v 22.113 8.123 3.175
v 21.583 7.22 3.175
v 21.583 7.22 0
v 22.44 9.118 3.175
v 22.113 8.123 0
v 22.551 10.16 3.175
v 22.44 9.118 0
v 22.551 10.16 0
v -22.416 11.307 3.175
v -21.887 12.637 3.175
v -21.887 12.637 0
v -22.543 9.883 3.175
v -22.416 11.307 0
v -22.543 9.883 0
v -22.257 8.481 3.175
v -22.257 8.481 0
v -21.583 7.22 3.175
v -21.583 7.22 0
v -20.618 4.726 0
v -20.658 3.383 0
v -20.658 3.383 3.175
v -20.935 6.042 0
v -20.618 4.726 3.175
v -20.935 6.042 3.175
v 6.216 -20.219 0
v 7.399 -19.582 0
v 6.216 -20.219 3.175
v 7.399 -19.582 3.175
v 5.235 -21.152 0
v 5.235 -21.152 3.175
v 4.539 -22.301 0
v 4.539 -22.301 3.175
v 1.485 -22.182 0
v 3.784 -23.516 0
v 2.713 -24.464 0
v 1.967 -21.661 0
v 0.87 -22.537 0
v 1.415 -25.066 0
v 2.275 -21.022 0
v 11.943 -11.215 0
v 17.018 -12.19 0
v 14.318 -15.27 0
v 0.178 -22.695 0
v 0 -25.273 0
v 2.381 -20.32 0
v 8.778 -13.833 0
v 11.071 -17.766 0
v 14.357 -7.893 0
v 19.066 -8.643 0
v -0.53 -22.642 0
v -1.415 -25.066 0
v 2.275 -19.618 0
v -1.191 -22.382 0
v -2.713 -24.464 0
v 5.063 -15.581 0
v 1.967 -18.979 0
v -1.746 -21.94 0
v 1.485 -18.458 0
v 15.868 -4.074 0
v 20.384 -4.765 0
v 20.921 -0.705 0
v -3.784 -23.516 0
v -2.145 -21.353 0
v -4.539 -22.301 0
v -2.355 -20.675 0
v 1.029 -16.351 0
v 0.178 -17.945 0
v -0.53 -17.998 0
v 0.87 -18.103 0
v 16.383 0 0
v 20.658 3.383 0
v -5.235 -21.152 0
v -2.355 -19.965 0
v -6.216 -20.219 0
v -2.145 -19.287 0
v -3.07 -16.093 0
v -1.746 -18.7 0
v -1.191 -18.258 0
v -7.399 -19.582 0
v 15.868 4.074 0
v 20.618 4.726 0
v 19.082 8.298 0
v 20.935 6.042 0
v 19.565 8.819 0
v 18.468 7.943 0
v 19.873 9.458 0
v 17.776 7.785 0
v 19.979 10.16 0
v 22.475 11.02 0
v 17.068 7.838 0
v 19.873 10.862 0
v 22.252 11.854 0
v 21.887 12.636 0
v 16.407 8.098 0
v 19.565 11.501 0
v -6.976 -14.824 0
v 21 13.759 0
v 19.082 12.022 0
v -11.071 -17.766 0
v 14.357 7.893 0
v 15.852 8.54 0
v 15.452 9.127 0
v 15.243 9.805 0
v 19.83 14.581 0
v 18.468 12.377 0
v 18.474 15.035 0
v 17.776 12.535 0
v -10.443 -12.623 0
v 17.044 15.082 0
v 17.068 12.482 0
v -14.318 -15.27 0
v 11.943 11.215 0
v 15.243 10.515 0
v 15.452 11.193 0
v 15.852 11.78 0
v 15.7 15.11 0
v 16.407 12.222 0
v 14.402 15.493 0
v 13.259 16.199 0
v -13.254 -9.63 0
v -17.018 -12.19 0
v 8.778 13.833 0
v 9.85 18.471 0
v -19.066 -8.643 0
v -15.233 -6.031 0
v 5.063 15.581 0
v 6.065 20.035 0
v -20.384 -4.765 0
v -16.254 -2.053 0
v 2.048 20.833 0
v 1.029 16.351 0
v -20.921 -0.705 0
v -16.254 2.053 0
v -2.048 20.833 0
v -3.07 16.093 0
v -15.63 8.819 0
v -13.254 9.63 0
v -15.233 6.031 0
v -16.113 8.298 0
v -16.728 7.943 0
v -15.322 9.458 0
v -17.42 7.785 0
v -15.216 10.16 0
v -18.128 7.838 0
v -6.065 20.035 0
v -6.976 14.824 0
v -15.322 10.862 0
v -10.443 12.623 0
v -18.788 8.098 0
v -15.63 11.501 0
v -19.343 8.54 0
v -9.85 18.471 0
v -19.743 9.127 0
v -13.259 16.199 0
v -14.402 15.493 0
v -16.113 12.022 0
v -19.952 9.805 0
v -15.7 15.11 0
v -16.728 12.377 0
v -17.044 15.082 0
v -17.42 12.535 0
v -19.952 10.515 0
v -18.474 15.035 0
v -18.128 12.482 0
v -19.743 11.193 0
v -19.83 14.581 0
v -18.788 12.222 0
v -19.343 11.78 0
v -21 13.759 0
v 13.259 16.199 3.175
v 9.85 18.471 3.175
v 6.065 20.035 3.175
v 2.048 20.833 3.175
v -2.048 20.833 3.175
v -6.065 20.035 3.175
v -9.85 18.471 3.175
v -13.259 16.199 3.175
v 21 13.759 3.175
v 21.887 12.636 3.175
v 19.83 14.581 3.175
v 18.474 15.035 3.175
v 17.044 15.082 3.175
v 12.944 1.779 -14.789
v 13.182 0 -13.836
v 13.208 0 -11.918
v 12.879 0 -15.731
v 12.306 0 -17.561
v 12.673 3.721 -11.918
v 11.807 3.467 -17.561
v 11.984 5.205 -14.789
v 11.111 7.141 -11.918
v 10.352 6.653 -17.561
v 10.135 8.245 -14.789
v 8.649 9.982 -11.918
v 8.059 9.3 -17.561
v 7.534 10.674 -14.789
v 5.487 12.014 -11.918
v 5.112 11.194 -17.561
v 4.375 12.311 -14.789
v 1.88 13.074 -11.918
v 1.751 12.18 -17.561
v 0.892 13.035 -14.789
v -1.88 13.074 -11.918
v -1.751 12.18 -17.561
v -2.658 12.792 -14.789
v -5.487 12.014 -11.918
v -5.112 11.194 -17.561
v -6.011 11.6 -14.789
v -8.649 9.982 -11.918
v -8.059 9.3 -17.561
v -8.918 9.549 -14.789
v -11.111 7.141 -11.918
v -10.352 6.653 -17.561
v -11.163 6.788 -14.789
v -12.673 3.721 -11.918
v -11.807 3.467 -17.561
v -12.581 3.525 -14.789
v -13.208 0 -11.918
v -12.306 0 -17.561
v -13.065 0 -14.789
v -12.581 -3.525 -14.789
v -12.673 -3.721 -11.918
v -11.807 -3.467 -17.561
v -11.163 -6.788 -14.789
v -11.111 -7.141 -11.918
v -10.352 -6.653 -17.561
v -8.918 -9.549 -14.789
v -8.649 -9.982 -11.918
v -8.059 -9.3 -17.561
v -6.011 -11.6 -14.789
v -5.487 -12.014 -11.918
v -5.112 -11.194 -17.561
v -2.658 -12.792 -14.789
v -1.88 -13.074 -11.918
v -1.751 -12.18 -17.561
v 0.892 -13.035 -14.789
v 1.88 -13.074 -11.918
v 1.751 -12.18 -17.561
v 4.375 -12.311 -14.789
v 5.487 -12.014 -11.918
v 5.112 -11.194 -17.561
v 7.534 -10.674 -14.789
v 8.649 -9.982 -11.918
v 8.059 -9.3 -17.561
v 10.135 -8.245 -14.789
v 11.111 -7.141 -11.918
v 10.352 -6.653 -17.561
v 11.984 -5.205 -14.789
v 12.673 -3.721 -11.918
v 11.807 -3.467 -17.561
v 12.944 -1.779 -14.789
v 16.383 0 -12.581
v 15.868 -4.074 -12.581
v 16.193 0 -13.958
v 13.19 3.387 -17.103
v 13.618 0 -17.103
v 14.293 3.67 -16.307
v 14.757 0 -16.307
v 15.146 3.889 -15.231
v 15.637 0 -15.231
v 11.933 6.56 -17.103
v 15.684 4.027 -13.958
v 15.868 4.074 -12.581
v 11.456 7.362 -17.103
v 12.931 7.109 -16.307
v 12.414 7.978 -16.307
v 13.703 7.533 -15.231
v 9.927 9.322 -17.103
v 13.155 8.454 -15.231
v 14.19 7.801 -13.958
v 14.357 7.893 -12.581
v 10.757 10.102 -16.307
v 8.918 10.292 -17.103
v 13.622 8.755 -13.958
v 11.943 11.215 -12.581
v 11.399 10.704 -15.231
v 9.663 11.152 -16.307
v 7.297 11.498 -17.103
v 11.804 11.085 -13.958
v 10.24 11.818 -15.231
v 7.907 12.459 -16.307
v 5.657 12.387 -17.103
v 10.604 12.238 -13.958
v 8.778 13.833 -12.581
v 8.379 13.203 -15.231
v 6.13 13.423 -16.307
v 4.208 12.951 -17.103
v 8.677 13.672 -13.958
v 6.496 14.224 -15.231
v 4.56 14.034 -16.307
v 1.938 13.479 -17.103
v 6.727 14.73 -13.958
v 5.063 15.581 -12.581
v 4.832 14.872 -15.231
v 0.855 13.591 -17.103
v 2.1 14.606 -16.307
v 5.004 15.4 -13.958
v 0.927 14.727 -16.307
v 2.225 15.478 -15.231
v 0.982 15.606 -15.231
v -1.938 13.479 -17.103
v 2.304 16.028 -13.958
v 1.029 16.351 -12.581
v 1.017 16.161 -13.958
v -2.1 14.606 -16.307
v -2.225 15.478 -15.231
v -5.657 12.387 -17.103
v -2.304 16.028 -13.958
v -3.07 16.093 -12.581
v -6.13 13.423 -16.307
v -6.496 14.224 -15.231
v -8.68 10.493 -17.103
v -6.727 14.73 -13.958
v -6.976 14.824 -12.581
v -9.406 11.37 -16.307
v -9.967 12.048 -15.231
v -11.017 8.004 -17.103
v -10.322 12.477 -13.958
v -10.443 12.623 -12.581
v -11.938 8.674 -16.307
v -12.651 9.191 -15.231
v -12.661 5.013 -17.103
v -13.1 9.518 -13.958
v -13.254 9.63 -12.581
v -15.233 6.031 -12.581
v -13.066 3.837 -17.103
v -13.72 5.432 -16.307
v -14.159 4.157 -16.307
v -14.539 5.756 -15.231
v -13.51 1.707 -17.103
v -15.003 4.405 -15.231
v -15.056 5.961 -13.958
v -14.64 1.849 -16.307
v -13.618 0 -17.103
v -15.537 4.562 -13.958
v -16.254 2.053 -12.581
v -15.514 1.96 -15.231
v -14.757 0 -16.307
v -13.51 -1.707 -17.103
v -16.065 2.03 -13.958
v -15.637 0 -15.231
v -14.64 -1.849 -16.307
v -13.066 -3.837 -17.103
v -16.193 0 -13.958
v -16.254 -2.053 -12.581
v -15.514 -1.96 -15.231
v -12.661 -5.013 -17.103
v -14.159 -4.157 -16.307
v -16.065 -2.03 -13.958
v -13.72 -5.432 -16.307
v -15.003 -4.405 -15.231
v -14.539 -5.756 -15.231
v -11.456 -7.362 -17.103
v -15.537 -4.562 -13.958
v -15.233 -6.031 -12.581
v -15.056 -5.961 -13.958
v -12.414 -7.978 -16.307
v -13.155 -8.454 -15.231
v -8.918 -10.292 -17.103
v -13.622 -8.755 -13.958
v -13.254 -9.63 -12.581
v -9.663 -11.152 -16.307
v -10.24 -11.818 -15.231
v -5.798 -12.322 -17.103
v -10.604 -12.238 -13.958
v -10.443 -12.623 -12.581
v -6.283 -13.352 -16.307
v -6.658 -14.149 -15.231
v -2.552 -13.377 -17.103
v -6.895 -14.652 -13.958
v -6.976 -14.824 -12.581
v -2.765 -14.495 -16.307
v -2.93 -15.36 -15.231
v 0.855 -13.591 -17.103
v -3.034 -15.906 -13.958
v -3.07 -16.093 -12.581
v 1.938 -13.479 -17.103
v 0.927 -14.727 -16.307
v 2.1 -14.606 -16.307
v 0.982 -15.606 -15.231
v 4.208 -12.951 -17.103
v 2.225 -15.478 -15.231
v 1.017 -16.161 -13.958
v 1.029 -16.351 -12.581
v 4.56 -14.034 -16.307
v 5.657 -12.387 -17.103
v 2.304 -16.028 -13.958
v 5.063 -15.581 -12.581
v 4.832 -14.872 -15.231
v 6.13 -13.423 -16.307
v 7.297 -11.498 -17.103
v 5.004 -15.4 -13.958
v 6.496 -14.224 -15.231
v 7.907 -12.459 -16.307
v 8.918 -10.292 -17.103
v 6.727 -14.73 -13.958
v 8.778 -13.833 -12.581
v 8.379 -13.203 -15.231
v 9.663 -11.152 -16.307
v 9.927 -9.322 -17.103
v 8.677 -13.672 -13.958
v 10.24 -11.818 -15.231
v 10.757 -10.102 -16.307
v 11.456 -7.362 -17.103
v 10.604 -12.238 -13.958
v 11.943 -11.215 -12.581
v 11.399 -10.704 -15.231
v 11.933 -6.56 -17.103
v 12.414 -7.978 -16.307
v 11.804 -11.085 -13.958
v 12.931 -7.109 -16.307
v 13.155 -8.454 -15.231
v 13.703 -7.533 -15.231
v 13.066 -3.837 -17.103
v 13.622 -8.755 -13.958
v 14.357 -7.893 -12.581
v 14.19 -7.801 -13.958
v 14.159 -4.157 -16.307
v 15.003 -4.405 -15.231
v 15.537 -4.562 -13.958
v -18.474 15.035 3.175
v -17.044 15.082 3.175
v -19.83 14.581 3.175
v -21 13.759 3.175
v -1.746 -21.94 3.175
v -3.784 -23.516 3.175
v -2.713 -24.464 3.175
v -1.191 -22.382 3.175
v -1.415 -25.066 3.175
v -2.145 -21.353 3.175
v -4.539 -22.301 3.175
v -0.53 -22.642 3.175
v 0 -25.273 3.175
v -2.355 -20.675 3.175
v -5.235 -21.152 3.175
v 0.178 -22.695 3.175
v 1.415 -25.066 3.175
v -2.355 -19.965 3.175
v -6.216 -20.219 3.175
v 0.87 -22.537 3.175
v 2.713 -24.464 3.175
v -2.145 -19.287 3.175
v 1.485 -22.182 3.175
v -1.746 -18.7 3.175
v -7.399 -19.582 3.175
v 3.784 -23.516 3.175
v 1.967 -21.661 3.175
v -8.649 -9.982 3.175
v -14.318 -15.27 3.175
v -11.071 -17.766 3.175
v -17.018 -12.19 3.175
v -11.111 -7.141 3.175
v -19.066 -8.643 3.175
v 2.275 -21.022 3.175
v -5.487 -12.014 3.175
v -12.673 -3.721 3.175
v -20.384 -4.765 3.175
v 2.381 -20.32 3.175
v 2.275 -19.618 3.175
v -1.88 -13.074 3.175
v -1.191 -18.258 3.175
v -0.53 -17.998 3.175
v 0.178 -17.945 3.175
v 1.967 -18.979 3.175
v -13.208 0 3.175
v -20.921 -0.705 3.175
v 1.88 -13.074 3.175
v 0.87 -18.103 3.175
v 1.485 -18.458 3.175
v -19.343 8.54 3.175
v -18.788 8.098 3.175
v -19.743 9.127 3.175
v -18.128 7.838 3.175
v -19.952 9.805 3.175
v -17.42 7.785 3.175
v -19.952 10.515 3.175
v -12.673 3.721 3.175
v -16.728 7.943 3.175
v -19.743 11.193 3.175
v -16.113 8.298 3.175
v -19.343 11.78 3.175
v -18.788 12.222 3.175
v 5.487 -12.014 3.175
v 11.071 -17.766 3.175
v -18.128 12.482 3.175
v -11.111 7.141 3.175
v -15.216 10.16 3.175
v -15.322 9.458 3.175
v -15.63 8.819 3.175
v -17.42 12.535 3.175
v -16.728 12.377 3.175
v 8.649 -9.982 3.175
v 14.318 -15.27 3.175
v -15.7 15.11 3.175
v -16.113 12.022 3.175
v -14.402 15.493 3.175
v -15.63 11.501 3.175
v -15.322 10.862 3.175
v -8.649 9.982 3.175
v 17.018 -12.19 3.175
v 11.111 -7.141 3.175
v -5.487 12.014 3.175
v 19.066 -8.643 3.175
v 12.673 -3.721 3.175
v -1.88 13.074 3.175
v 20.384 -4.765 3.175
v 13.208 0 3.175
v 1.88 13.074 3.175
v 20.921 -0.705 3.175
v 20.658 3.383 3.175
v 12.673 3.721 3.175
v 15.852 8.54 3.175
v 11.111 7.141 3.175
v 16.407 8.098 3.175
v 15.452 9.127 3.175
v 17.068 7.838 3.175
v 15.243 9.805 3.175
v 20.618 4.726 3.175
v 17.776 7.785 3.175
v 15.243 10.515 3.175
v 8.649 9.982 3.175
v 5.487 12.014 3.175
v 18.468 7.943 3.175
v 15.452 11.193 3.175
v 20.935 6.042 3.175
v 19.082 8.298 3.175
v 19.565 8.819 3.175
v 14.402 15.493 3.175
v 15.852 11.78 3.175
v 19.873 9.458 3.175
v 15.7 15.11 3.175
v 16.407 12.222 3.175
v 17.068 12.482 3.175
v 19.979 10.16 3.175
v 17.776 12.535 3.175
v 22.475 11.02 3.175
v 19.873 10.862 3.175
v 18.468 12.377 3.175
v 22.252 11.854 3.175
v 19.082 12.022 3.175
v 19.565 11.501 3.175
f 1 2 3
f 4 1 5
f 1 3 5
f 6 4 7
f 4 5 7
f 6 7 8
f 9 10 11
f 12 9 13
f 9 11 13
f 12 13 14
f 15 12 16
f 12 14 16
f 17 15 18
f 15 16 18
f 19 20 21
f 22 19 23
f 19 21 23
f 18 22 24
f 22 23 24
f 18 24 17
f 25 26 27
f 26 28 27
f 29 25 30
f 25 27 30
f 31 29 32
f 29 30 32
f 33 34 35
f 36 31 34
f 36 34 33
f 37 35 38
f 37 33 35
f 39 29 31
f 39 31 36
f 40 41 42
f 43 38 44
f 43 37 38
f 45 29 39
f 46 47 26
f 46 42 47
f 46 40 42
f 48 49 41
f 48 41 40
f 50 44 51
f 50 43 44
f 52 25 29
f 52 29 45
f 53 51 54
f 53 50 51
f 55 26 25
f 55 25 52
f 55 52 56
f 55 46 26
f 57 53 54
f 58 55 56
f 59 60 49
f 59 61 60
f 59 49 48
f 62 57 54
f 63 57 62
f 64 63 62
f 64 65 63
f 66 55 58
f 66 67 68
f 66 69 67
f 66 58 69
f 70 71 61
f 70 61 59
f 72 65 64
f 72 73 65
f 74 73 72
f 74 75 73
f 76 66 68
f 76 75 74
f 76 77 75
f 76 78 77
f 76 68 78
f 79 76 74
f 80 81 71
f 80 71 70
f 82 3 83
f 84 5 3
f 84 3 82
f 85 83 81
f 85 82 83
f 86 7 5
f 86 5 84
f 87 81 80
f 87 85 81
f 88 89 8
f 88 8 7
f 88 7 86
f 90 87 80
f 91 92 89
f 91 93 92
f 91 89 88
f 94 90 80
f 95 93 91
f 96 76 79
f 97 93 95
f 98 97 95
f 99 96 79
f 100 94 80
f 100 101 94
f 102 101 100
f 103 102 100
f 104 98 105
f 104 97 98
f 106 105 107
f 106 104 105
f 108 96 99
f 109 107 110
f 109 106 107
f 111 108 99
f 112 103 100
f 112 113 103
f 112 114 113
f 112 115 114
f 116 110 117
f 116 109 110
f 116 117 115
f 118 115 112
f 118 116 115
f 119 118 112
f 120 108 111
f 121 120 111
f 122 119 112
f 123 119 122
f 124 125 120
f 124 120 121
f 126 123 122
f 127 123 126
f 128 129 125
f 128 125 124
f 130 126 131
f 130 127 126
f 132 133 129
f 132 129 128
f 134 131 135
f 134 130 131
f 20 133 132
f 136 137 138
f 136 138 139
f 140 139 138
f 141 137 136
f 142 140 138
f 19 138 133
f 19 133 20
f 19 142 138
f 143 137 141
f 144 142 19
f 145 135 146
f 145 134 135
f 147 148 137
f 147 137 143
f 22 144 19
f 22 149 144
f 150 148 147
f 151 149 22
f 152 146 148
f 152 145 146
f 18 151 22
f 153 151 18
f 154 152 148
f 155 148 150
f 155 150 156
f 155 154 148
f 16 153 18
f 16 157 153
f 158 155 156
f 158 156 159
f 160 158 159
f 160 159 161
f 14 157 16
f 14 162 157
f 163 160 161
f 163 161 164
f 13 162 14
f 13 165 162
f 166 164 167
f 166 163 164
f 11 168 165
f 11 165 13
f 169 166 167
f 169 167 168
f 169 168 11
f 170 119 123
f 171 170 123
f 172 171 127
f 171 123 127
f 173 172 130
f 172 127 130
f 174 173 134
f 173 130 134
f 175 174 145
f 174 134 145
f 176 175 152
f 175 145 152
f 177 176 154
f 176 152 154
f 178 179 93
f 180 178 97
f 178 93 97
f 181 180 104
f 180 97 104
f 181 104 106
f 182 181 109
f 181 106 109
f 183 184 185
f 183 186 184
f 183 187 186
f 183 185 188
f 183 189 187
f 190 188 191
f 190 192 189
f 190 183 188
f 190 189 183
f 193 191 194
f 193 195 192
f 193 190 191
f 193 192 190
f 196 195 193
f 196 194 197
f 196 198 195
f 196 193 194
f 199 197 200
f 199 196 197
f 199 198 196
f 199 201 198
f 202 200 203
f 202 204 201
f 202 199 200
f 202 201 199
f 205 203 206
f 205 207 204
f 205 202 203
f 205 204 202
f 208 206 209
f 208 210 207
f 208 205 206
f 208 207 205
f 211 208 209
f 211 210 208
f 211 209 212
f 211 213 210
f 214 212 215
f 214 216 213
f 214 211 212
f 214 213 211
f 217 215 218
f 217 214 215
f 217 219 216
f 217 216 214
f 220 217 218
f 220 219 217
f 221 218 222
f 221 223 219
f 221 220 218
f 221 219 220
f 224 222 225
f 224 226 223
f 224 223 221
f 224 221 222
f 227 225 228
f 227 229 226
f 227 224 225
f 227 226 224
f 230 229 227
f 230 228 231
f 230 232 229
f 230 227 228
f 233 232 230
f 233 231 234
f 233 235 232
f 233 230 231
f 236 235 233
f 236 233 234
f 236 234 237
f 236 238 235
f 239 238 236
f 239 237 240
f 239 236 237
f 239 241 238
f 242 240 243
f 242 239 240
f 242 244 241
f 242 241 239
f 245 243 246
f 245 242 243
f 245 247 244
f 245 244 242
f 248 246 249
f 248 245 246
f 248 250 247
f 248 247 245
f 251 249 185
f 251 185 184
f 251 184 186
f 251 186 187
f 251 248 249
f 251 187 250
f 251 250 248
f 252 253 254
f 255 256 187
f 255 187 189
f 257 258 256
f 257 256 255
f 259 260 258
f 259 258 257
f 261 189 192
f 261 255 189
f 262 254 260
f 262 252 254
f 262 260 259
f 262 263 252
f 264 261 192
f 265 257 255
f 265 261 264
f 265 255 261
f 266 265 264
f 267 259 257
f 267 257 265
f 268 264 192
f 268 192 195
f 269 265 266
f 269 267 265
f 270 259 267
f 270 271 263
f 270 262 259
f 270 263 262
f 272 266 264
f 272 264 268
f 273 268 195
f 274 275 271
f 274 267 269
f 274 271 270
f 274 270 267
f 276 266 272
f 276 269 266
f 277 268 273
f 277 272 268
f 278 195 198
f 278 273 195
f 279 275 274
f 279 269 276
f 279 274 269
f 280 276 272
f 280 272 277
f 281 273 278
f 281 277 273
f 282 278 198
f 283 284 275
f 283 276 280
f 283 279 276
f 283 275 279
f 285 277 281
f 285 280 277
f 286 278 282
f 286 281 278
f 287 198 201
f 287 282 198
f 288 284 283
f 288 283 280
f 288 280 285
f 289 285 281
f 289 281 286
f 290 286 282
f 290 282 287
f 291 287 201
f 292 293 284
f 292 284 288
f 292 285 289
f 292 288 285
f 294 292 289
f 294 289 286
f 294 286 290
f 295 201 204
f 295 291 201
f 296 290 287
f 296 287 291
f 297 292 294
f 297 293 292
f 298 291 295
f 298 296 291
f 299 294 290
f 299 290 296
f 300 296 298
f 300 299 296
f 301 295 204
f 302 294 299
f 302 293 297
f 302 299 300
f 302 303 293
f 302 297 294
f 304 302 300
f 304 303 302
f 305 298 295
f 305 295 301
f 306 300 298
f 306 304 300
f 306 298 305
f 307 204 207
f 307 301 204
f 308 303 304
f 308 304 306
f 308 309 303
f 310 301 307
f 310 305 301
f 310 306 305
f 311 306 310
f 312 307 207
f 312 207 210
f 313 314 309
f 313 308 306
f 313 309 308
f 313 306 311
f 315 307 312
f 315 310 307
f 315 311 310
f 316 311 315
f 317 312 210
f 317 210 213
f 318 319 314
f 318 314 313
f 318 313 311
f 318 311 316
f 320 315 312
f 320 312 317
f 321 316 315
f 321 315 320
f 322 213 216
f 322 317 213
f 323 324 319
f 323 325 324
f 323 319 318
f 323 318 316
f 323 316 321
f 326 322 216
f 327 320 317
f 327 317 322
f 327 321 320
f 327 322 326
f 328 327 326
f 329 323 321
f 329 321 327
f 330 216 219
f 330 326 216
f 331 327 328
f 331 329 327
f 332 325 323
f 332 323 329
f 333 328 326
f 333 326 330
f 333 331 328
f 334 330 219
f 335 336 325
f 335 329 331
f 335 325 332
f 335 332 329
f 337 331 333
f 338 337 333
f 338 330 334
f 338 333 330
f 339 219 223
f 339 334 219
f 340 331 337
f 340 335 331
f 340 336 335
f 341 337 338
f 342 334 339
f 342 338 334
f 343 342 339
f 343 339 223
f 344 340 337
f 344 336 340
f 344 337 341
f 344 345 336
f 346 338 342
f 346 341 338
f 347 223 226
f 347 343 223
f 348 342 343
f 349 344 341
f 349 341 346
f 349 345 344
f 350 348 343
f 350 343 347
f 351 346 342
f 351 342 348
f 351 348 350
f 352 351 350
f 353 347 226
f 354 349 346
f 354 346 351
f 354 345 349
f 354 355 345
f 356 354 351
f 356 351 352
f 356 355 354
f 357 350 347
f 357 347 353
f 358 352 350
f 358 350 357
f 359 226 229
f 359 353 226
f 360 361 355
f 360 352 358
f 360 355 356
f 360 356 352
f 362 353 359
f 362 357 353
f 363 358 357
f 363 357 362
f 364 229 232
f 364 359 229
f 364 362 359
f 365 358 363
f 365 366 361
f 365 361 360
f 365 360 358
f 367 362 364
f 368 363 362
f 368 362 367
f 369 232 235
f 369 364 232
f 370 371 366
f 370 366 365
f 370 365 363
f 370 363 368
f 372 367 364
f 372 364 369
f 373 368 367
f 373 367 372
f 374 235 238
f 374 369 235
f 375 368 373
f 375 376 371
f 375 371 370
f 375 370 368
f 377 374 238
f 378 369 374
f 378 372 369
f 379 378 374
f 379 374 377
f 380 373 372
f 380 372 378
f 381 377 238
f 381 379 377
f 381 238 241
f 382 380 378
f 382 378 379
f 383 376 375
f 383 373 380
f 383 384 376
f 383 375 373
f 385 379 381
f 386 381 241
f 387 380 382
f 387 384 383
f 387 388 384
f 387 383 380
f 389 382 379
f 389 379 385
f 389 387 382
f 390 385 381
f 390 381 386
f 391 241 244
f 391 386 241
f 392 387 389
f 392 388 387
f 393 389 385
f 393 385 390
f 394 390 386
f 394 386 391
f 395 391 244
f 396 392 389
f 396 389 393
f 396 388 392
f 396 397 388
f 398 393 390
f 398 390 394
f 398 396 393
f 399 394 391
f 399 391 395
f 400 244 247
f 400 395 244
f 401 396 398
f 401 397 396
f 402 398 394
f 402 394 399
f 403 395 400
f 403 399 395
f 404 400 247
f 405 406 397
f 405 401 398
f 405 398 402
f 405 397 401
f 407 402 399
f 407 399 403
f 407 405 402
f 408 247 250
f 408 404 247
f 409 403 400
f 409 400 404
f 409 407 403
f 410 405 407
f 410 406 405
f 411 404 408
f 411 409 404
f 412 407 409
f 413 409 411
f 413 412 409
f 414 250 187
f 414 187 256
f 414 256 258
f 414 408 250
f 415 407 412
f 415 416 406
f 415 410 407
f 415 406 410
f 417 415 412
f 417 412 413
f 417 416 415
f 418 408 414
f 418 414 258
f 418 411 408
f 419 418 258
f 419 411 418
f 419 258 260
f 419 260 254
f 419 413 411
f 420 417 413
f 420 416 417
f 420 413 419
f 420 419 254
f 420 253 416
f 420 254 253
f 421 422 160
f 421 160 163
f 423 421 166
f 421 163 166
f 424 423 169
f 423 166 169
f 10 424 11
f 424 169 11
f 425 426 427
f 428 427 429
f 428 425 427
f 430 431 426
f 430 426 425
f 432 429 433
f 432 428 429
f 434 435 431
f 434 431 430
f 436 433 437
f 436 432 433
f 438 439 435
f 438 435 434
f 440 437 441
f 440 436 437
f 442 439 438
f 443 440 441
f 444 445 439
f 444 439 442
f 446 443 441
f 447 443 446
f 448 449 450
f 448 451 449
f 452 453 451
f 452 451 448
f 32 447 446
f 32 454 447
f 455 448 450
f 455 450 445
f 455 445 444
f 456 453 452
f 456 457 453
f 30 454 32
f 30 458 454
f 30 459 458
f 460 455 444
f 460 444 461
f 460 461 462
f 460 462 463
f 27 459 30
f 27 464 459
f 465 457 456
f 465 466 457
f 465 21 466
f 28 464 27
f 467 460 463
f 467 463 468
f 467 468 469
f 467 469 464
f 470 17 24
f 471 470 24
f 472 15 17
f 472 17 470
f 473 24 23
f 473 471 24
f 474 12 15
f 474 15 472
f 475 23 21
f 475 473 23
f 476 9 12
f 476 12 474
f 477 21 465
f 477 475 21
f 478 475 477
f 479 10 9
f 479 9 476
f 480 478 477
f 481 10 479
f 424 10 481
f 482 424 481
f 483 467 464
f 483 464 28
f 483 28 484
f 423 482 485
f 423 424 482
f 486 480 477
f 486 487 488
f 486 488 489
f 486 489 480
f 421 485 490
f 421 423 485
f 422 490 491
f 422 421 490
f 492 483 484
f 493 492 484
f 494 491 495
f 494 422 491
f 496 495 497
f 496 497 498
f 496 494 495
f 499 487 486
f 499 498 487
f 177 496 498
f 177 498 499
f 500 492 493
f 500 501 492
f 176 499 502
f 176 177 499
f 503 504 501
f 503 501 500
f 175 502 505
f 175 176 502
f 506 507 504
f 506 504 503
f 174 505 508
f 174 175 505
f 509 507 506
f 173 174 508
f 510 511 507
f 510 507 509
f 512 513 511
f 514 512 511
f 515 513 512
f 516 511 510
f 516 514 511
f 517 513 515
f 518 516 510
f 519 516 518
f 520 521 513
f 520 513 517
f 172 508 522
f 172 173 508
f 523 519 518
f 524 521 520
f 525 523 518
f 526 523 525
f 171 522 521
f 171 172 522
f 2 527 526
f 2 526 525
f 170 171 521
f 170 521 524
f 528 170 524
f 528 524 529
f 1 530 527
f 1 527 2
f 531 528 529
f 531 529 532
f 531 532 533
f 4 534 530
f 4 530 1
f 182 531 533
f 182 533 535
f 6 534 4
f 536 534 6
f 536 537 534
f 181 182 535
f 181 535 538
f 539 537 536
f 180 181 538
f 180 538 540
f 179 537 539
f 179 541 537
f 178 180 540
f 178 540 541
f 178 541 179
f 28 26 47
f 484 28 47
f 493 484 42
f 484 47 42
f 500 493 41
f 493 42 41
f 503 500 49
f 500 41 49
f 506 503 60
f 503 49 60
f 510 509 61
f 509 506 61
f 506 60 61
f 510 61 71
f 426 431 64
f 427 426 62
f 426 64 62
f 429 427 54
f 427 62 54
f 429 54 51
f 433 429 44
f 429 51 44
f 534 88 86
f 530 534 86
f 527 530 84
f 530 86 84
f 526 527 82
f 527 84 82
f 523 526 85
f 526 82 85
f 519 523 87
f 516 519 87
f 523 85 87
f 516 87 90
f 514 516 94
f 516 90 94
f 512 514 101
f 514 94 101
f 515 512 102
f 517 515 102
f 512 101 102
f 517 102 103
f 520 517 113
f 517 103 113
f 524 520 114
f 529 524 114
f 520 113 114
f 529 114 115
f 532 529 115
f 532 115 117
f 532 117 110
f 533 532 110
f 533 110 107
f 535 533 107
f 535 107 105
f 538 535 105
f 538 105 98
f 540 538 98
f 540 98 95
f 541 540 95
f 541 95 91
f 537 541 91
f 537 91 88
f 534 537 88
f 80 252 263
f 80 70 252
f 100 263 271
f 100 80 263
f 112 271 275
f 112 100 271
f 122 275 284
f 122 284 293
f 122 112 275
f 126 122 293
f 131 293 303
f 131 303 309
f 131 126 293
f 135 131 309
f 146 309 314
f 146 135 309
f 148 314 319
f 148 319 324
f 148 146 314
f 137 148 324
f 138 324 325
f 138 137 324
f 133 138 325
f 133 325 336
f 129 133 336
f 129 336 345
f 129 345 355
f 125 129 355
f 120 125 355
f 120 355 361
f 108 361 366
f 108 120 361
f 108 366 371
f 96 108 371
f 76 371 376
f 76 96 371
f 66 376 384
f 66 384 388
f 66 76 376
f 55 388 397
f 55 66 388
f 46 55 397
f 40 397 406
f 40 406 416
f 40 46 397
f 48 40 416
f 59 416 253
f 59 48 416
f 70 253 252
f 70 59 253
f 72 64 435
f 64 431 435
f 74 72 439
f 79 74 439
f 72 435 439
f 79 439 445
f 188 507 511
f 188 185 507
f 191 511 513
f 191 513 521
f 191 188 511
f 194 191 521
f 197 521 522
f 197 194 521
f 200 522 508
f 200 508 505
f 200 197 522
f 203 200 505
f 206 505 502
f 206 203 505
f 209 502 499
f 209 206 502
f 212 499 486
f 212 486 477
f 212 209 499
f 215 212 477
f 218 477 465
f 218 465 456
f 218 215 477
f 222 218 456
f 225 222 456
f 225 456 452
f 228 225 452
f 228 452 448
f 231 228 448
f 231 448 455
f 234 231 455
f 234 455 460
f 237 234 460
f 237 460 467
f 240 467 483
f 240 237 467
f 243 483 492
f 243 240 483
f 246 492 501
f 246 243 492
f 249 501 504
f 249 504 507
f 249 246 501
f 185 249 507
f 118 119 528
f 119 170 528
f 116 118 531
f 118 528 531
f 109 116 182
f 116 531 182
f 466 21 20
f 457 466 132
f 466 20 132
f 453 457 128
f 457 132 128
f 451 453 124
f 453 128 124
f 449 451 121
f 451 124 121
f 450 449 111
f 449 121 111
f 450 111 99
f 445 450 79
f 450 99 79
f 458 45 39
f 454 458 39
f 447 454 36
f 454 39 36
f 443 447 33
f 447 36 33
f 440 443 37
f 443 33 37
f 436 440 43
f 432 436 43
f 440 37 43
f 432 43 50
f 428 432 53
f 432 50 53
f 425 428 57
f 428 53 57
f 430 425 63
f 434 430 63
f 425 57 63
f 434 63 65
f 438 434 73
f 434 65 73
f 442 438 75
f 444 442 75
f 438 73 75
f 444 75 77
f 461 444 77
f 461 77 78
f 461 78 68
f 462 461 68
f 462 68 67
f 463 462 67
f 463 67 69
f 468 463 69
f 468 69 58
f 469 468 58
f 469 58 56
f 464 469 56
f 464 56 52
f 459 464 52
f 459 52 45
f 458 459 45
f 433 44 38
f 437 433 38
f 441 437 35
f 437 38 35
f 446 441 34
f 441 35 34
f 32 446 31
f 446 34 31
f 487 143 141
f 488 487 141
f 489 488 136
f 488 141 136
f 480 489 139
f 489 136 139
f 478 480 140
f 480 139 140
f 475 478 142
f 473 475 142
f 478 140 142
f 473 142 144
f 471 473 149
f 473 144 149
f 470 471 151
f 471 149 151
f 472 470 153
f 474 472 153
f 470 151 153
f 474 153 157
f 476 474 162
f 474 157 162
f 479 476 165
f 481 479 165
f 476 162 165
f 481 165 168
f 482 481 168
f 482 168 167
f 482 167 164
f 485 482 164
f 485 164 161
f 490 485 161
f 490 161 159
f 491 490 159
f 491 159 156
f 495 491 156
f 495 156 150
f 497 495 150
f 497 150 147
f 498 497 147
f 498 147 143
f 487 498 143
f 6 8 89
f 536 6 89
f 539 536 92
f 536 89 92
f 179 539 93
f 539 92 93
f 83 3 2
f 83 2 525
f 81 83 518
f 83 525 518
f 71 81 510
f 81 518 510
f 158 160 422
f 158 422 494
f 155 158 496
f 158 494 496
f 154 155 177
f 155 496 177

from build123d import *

# Parameters (mm, degrees)
F1_W     = 8.89
F1_H     = 3.175
F3_R     = 2.38125
F4_DEPTH = 3.176
F7_DEPTH = 3.176
F8_R     = 5.08


# Not quite as in the source:
# - a fillet or chamfer that OpenCascade refuses, or shapes differently, is made with other operations: its cross-section is extruded or revolved along the edge and cut away or added


with BuildPart() as f2:
    # F1 (on Front) → F2 (revolve)
    with BuildSketch(Plane.XZ):
        with BuildLine():
            ThreePointArc((13.208, -11.9177163316), (13.0652297207, -14.7887805254), (12.3057501177, -17.5612494052))
            Line((12.3057501177, -17.5612494052), (16.383, -17.5612494052))
            Line((16.383, -17.5612494052), (16.383, 0))
            Line((16.383, 0), (16.383, 3.175))
            Line((16.383, 3.175), (13.208, 3.175))
            Line((13.208, 3.175), (13.208, -11.9177163316))
        make_face()
        with Locations((20.828, 1.5875)):
            Rectangle(F1_W, F1_H)
    revolve(axis=Axis((0, 0, -9.4681101426), (0, 0, 1)))

    # F3 (on face) → F4 (cut, through all)
    with BuildSketch(Plane(origin=(0, 0, 0), x_dir=(1, 0, 0), z_dir=(0, 0, -1))):
        with BuildLine():
            ThreePointArc((0, 17.93875), (1.6837980227, 18.6362019773), (2.38125, 20.32))
            ThreePointArc((2.38125, 20.32), (-1.6837980227, 22.0037980227), (0, 17.93875))
        make_face()
        with Locations((-17.5976362049, -10.16)):
            Circle(F3_R)
        with Locations((17.5976362049, -10.16)):
            Circle(F3_R)
    extrude(amount=-F4_DEPTH, mode=Mode.SUBTRACT)

    # F5: fillet of radius 5.08 on 1 edges, made by hand

    # F5_s1 → F5_t2 (revolve, cut)
    with BuildSketch(Plane.XZ):
        with BuildLine():
            ThreePointArc((12.3057501177, -17.5612494052), (15.2336723724, -15.7993073042), (16.383, -12.5811999876))
            Line((16.383, -12.5811999876), (16.383, -17.5612494052))
            Line((16.383, -17.5612494052), (12.3057501177, -17.5612494052))
        make_face()
    revolve(axis=Axis((0, 0, -17.5612494052), (0, 0, 1)), mode=Mode.SUBTRACT)

    # F6 (on face) → F7 (cut, through all)
    with BuildSketch(Plane(origin=(0, 0, 0), x_dir=(1, 0, 0), z_dir=(0, 0, -1))):
        with BuildLine():
            ThreePointArc((-4.952964542, 20.3387415379), (-3.495667473, 23.8289197652), (0, 25.273))
            ThreePointArc((0, 25.273), (-21.8870601005, 12.6364998776), (-21.8870598885, -12.6365002448))
            ThreePointArc((-21.8870598885, -12.6365002448), (-22.3842836342, -8.8871231844), (-20.0903491238, -5.8799776515))
            ThreePointArc((-20.0903491238, -5.8799776515), (-18.1286292594, 10.4665689829), (-4.952964542, 20.3387415379))
        make_face()
        with BuildLine():
            ThreePointArc((0, 25.273), (3.495667473, 23.8289197652), (4.952964542, 20.3387415379))
            ThreePointArc((4.952964542, 20.3387415379), (18.1286292594, 10.4665689829), (20.0903491238, -5.8799776515))
            ThreePointArc((20.0903491238, -5.8799776515), (21.8917377458, -7.6916197707), (22.5506362049, -10.16))
            ThreePointArc((22.5506362049, -10.16), (22.3818668231, -11.4419307281), (21.8870600322, -12.6364999959))
            ThreePointArc((21.8870600322, -12.6364999959), (24.4118434084, -6.5411337246), (25.273, 0))
            ThreePointArc((25.273, 0), (17.8707096809, 17.8707096809), (0, 25.273))
        make_face()
        with BuildLine():
            ThreePointArc((-15.1373845818, -14.4587638864), (-18.8886159884, -14.9417967542), (-21.8870598885, -12.6365002448))
            ThreePointArc((-21.8870598885, -12.6365002448), (1.437e-07, -25.273), (21.8870600322, -12.6364999959))
            ThreePointArc((21.8870600322, -12.6364999959), (18.8886161272, -14.9417967167), (15.1373845818, -14.4587638864))
            ThreePointArc((15.1373845818, -14.4587638864), (0, -20.9331379659), (-15.1373845818, -14.4587638864))
        make_face()
    extrude(amount=-F7_DEPTH, mode=Mode.SUBTRACT)

    # F8
    f8_edges = [f2.edges().sort_by_distance(p)[0] for p in [
        (-15.137385, 14.458764, 1.5875),
        (15.137385, 14.458764, 1.5875),
        (20.090349, 5.879978, 1.5875),
        (4.952965, -20.338742, 1.5875),
        (-4.952965, -20.338742, 1.5875),
        (-20.090349, 5.879978, 1.5875),
    ]]
    fillet(f8_edges, radius=F8_R)


solid = f2.part
